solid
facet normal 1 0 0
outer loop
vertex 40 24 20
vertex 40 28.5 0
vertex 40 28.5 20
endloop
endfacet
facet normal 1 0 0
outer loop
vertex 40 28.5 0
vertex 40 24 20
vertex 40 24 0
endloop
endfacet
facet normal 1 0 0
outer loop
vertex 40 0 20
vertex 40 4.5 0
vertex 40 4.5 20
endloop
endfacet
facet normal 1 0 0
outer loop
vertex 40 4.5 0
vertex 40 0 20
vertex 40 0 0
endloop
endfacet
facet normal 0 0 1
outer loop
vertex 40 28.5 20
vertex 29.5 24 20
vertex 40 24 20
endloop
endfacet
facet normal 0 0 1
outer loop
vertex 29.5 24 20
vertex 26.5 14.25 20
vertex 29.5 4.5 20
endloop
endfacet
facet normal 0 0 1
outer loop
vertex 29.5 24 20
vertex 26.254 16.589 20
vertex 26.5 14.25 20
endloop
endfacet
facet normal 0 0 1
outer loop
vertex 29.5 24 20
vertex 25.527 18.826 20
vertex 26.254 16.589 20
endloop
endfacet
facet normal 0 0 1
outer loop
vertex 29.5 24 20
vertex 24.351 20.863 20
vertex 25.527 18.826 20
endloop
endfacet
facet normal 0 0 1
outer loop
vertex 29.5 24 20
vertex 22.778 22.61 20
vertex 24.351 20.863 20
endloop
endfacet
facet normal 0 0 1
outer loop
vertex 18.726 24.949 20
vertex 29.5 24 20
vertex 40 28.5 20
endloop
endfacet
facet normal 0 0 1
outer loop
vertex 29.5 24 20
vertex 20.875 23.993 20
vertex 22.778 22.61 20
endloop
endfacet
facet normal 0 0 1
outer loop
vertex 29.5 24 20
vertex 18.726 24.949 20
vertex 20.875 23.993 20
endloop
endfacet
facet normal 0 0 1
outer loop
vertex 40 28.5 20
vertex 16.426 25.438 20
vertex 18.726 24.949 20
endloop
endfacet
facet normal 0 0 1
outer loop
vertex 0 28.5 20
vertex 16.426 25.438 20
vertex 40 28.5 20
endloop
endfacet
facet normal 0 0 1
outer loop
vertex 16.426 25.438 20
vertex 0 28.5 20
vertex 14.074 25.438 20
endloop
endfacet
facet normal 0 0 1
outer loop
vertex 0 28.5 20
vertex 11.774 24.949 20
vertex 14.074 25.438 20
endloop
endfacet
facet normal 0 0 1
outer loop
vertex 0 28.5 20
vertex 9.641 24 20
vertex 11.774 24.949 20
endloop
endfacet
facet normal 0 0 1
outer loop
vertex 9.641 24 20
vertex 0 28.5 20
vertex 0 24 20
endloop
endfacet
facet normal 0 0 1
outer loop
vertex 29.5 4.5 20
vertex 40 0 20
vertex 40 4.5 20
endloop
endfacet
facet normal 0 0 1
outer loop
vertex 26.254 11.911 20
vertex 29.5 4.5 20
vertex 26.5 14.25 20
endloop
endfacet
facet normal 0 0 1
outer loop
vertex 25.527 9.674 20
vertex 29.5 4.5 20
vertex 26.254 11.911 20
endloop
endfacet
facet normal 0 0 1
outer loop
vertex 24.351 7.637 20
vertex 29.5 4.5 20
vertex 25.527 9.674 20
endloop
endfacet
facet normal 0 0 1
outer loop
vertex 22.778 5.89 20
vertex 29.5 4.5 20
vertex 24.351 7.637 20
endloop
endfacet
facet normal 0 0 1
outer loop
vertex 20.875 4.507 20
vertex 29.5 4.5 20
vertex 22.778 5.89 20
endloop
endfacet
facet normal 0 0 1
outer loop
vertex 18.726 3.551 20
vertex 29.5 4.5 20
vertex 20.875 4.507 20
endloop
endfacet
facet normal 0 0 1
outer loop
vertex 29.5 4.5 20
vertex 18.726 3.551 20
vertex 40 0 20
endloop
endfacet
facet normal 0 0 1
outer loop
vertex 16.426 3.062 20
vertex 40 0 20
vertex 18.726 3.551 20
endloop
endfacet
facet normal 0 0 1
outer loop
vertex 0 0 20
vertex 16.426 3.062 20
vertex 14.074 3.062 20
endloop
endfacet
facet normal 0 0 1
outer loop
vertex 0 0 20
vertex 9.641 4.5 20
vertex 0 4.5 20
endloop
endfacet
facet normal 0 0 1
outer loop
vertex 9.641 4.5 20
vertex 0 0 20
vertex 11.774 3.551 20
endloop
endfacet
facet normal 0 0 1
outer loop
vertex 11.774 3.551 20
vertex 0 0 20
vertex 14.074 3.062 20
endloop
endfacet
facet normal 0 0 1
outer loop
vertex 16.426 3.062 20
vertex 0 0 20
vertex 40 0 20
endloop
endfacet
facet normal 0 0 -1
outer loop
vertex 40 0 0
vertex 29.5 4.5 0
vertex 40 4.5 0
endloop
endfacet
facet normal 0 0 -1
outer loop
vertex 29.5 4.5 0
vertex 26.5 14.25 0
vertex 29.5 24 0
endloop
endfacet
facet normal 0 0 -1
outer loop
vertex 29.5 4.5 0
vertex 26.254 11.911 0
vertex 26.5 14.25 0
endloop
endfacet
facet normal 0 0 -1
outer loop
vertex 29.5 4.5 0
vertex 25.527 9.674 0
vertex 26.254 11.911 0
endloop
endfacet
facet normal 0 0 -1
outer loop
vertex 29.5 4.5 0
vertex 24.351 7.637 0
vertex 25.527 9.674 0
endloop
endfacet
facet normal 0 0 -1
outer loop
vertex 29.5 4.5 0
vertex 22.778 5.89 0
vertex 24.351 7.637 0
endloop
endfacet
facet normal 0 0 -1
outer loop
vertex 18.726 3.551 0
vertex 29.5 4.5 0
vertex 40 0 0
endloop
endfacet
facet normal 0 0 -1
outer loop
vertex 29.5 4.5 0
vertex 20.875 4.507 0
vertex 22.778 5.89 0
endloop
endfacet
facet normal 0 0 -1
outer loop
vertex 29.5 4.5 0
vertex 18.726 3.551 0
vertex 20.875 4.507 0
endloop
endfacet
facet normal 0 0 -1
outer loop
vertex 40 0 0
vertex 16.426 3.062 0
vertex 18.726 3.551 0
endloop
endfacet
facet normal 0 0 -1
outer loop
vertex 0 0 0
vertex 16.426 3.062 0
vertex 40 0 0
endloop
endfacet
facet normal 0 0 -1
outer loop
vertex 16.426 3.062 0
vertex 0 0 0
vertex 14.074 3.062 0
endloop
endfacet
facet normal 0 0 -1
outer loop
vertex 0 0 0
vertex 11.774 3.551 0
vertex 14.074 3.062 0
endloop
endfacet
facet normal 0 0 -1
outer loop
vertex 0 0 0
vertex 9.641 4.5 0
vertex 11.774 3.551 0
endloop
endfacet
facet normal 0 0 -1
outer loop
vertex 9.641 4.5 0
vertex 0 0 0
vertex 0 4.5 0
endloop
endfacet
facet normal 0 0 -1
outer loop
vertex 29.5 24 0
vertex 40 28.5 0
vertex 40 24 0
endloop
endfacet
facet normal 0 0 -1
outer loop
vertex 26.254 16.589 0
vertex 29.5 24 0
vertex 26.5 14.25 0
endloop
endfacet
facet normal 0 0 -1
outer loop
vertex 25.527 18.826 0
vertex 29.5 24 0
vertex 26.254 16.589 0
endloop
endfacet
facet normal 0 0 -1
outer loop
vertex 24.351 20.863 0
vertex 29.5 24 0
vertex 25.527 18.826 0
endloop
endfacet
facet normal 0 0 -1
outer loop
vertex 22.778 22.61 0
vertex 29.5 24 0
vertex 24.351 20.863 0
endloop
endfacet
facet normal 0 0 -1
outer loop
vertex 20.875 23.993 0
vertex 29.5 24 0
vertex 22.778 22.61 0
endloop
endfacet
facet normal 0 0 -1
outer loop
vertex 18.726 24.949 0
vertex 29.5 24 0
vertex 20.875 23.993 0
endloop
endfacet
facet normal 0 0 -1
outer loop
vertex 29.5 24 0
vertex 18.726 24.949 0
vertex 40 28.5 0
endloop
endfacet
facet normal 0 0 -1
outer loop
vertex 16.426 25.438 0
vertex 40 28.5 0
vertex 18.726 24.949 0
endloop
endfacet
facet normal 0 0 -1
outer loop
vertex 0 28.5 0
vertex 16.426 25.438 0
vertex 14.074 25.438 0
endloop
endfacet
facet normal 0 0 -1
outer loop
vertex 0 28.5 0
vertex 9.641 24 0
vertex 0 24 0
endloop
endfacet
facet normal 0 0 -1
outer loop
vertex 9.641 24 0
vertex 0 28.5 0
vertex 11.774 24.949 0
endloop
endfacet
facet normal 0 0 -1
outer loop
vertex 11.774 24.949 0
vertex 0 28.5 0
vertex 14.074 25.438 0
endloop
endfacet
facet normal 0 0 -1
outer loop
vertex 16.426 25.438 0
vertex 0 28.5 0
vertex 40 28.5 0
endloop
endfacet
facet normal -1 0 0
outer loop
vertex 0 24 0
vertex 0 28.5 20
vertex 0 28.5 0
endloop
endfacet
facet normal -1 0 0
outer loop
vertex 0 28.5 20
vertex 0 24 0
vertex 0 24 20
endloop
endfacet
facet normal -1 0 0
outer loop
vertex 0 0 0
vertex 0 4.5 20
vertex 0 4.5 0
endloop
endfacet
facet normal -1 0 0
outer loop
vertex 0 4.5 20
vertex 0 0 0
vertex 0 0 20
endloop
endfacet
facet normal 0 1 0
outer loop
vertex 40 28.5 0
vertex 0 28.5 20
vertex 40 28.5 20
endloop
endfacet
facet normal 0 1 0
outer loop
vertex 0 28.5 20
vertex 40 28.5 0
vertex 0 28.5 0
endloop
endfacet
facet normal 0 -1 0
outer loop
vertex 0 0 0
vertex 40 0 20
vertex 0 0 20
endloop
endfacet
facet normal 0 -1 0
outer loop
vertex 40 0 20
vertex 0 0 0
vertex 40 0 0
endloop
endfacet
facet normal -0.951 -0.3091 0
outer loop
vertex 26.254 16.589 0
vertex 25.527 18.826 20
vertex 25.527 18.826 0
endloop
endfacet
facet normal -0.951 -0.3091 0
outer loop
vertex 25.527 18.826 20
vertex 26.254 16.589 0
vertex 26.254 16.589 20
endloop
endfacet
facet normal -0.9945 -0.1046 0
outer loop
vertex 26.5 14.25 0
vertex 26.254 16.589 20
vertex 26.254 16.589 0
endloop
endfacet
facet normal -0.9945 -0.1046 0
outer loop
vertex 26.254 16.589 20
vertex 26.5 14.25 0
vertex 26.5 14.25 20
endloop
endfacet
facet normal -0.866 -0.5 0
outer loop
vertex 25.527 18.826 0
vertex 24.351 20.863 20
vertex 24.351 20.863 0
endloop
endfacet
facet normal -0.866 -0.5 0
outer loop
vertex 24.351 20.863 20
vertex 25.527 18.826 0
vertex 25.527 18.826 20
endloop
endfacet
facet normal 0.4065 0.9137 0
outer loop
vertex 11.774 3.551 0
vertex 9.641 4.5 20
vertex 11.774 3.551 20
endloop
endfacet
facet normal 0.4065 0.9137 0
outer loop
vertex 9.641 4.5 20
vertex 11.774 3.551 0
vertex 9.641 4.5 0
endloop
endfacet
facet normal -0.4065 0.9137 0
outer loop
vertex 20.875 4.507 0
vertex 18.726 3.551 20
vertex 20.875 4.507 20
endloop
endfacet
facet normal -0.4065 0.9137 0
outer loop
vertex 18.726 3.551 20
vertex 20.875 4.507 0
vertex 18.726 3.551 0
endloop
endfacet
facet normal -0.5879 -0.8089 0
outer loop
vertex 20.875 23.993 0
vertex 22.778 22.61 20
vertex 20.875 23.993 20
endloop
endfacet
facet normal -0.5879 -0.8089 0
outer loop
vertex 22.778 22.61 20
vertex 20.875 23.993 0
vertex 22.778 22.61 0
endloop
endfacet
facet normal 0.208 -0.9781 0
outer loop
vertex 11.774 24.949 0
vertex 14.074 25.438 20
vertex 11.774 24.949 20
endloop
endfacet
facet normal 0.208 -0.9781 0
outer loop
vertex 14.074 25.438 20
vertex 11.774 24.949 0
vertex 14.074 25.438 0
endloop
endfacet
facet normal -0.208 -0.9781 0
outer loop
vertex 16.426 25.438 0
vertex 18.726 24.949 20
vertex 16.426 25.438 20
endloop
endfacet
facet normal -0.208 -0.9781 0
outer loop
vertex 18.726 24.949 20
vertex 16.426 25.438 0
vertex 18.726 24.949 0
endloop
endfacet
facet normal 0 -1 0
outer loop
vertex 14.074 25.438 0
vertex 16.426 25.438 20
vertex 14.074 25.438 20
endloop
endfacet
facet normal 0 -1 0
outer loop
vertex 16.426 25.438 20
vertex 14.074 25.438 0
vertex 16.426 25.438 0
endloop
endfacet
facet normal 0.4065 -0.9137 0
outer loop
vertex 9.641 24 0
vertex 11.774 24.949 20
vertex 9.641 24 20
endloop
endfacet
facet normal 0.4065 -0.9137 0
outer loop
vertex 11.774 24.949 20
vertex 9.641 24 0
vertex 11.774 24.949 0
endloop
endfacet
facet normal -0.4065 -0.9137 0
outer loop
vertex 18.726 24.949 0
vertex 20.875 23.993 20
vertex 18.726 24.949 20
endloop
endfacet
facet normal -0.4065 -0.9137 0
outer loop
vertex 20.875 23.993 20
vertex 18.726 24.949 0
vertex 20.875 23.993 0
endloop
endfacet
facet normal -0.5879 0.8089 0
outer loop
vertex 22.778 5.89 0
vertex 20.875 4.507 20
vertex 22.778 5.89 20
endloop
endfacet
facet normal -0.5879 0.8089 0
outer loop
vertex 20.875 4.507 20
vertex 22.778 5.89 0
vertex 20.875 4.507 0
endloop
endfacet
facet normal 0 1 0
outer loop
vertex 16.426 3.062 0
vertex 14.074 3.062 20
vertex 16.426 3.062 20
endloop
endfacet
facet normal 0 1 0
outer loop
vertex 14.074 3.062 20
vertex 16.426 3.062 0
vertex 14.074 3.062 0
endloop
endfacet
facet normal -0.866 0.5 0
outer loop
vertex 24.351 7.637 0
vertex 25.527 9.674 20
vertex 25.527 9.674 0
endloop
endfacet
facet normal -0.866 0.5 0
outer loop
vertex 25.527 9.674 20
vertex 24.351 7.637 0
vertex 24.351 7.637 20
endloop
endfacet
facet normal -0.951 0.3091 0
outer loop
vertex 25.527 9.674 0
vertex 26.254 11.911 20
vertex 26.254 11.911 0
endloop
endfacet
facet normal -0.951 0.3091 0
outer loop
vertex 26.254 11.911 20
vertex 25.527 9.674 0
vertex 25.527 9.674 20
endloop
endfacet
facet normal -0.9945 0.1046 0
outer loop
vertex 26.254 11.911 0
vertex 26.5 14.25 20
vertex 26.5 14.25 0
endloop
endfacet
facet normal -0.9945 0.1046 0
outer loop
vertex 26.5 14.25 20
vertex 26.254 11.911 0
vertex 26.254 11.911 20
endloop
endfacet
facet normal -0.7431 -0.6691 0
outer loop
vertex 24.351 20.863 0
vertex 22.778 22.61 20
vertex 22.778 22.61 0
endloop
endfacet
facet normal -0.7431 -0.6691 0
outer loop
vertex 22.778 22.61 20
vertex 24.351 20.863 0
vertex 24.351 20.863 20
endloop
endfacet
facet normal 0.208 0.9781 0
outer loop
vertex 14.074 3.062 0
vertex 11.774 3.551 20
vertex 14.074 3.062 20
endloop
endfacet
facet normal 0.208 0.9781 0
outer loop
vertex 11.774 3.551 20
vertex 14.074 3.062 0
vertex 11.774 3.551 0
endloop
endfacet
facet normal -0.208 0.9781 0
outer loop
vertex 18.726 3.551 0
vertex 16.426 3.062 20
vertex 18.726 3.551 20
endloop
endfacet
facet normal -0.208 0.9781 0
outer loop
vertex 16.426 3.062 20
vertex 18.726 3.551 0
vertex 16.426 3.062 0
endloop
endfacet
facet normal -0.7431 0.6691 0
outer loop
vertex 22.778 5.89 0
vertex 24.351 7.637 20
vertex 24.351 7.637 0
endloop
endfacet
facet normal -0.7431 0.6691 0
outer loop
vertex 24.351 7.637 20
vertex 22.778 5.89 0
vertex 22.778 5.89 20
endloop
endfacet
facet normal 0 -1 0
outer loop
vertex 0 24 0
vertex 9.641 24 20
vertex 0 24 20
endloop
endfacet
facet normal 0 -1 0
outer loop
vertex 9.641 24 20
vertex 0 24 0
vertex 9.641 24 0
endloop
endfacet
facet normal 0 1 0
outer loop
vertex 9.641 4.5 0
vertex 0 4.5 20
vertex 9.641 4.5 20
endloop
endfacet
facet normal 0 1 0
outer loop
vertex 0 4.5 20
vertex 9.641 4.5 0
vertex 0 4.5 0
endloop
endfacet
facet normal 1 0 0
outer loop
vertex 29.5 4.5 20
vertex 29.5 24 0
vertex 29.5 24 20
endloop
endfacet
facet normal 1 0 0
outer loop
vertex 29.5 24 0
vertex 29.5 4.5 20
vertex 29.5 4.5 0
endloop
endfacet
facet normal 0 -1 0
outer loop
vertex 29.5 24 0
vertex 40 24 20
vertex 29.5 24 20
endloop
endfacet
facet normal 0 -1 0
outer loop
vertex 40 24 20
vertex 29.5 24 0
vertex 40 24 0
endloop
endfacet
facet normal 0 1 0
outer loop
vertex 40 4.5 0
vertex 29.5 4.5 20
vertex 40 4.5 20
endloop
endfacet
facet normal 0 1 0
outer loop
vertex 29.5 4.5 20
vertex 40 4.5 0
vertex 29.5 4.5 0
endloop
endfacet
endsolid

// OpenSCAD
hole_diam = 22.5; // mm
height = 40; // mm
sides = 3.0; // mm
thickness = 20; //mm
bottom_offset = 4; // mm

difference() {
  cube([height, hole_diam + 2 * sides, thickness]);
  translate([hole_diam / 2 + bottom_offset, hole_diam / 2 + sides, -0.1]) {
    cylinder(d=hole_diam, h=thickness + 0.2);
  }
  translate([-0.1, hole_diam / 2 + sides, 0]) {
    cube([hole_diam - sides, hole_diam - sides, 2 * thickness + 0.2], true);
  }

  translate([height, hole_diam / 2 + sides, 0]) {
    cube([2 * (height - hole_diam - bottom_offset - sides),
          hole_diam - sides,
          2 * thickness + 0.2],
         true);
  }
}
